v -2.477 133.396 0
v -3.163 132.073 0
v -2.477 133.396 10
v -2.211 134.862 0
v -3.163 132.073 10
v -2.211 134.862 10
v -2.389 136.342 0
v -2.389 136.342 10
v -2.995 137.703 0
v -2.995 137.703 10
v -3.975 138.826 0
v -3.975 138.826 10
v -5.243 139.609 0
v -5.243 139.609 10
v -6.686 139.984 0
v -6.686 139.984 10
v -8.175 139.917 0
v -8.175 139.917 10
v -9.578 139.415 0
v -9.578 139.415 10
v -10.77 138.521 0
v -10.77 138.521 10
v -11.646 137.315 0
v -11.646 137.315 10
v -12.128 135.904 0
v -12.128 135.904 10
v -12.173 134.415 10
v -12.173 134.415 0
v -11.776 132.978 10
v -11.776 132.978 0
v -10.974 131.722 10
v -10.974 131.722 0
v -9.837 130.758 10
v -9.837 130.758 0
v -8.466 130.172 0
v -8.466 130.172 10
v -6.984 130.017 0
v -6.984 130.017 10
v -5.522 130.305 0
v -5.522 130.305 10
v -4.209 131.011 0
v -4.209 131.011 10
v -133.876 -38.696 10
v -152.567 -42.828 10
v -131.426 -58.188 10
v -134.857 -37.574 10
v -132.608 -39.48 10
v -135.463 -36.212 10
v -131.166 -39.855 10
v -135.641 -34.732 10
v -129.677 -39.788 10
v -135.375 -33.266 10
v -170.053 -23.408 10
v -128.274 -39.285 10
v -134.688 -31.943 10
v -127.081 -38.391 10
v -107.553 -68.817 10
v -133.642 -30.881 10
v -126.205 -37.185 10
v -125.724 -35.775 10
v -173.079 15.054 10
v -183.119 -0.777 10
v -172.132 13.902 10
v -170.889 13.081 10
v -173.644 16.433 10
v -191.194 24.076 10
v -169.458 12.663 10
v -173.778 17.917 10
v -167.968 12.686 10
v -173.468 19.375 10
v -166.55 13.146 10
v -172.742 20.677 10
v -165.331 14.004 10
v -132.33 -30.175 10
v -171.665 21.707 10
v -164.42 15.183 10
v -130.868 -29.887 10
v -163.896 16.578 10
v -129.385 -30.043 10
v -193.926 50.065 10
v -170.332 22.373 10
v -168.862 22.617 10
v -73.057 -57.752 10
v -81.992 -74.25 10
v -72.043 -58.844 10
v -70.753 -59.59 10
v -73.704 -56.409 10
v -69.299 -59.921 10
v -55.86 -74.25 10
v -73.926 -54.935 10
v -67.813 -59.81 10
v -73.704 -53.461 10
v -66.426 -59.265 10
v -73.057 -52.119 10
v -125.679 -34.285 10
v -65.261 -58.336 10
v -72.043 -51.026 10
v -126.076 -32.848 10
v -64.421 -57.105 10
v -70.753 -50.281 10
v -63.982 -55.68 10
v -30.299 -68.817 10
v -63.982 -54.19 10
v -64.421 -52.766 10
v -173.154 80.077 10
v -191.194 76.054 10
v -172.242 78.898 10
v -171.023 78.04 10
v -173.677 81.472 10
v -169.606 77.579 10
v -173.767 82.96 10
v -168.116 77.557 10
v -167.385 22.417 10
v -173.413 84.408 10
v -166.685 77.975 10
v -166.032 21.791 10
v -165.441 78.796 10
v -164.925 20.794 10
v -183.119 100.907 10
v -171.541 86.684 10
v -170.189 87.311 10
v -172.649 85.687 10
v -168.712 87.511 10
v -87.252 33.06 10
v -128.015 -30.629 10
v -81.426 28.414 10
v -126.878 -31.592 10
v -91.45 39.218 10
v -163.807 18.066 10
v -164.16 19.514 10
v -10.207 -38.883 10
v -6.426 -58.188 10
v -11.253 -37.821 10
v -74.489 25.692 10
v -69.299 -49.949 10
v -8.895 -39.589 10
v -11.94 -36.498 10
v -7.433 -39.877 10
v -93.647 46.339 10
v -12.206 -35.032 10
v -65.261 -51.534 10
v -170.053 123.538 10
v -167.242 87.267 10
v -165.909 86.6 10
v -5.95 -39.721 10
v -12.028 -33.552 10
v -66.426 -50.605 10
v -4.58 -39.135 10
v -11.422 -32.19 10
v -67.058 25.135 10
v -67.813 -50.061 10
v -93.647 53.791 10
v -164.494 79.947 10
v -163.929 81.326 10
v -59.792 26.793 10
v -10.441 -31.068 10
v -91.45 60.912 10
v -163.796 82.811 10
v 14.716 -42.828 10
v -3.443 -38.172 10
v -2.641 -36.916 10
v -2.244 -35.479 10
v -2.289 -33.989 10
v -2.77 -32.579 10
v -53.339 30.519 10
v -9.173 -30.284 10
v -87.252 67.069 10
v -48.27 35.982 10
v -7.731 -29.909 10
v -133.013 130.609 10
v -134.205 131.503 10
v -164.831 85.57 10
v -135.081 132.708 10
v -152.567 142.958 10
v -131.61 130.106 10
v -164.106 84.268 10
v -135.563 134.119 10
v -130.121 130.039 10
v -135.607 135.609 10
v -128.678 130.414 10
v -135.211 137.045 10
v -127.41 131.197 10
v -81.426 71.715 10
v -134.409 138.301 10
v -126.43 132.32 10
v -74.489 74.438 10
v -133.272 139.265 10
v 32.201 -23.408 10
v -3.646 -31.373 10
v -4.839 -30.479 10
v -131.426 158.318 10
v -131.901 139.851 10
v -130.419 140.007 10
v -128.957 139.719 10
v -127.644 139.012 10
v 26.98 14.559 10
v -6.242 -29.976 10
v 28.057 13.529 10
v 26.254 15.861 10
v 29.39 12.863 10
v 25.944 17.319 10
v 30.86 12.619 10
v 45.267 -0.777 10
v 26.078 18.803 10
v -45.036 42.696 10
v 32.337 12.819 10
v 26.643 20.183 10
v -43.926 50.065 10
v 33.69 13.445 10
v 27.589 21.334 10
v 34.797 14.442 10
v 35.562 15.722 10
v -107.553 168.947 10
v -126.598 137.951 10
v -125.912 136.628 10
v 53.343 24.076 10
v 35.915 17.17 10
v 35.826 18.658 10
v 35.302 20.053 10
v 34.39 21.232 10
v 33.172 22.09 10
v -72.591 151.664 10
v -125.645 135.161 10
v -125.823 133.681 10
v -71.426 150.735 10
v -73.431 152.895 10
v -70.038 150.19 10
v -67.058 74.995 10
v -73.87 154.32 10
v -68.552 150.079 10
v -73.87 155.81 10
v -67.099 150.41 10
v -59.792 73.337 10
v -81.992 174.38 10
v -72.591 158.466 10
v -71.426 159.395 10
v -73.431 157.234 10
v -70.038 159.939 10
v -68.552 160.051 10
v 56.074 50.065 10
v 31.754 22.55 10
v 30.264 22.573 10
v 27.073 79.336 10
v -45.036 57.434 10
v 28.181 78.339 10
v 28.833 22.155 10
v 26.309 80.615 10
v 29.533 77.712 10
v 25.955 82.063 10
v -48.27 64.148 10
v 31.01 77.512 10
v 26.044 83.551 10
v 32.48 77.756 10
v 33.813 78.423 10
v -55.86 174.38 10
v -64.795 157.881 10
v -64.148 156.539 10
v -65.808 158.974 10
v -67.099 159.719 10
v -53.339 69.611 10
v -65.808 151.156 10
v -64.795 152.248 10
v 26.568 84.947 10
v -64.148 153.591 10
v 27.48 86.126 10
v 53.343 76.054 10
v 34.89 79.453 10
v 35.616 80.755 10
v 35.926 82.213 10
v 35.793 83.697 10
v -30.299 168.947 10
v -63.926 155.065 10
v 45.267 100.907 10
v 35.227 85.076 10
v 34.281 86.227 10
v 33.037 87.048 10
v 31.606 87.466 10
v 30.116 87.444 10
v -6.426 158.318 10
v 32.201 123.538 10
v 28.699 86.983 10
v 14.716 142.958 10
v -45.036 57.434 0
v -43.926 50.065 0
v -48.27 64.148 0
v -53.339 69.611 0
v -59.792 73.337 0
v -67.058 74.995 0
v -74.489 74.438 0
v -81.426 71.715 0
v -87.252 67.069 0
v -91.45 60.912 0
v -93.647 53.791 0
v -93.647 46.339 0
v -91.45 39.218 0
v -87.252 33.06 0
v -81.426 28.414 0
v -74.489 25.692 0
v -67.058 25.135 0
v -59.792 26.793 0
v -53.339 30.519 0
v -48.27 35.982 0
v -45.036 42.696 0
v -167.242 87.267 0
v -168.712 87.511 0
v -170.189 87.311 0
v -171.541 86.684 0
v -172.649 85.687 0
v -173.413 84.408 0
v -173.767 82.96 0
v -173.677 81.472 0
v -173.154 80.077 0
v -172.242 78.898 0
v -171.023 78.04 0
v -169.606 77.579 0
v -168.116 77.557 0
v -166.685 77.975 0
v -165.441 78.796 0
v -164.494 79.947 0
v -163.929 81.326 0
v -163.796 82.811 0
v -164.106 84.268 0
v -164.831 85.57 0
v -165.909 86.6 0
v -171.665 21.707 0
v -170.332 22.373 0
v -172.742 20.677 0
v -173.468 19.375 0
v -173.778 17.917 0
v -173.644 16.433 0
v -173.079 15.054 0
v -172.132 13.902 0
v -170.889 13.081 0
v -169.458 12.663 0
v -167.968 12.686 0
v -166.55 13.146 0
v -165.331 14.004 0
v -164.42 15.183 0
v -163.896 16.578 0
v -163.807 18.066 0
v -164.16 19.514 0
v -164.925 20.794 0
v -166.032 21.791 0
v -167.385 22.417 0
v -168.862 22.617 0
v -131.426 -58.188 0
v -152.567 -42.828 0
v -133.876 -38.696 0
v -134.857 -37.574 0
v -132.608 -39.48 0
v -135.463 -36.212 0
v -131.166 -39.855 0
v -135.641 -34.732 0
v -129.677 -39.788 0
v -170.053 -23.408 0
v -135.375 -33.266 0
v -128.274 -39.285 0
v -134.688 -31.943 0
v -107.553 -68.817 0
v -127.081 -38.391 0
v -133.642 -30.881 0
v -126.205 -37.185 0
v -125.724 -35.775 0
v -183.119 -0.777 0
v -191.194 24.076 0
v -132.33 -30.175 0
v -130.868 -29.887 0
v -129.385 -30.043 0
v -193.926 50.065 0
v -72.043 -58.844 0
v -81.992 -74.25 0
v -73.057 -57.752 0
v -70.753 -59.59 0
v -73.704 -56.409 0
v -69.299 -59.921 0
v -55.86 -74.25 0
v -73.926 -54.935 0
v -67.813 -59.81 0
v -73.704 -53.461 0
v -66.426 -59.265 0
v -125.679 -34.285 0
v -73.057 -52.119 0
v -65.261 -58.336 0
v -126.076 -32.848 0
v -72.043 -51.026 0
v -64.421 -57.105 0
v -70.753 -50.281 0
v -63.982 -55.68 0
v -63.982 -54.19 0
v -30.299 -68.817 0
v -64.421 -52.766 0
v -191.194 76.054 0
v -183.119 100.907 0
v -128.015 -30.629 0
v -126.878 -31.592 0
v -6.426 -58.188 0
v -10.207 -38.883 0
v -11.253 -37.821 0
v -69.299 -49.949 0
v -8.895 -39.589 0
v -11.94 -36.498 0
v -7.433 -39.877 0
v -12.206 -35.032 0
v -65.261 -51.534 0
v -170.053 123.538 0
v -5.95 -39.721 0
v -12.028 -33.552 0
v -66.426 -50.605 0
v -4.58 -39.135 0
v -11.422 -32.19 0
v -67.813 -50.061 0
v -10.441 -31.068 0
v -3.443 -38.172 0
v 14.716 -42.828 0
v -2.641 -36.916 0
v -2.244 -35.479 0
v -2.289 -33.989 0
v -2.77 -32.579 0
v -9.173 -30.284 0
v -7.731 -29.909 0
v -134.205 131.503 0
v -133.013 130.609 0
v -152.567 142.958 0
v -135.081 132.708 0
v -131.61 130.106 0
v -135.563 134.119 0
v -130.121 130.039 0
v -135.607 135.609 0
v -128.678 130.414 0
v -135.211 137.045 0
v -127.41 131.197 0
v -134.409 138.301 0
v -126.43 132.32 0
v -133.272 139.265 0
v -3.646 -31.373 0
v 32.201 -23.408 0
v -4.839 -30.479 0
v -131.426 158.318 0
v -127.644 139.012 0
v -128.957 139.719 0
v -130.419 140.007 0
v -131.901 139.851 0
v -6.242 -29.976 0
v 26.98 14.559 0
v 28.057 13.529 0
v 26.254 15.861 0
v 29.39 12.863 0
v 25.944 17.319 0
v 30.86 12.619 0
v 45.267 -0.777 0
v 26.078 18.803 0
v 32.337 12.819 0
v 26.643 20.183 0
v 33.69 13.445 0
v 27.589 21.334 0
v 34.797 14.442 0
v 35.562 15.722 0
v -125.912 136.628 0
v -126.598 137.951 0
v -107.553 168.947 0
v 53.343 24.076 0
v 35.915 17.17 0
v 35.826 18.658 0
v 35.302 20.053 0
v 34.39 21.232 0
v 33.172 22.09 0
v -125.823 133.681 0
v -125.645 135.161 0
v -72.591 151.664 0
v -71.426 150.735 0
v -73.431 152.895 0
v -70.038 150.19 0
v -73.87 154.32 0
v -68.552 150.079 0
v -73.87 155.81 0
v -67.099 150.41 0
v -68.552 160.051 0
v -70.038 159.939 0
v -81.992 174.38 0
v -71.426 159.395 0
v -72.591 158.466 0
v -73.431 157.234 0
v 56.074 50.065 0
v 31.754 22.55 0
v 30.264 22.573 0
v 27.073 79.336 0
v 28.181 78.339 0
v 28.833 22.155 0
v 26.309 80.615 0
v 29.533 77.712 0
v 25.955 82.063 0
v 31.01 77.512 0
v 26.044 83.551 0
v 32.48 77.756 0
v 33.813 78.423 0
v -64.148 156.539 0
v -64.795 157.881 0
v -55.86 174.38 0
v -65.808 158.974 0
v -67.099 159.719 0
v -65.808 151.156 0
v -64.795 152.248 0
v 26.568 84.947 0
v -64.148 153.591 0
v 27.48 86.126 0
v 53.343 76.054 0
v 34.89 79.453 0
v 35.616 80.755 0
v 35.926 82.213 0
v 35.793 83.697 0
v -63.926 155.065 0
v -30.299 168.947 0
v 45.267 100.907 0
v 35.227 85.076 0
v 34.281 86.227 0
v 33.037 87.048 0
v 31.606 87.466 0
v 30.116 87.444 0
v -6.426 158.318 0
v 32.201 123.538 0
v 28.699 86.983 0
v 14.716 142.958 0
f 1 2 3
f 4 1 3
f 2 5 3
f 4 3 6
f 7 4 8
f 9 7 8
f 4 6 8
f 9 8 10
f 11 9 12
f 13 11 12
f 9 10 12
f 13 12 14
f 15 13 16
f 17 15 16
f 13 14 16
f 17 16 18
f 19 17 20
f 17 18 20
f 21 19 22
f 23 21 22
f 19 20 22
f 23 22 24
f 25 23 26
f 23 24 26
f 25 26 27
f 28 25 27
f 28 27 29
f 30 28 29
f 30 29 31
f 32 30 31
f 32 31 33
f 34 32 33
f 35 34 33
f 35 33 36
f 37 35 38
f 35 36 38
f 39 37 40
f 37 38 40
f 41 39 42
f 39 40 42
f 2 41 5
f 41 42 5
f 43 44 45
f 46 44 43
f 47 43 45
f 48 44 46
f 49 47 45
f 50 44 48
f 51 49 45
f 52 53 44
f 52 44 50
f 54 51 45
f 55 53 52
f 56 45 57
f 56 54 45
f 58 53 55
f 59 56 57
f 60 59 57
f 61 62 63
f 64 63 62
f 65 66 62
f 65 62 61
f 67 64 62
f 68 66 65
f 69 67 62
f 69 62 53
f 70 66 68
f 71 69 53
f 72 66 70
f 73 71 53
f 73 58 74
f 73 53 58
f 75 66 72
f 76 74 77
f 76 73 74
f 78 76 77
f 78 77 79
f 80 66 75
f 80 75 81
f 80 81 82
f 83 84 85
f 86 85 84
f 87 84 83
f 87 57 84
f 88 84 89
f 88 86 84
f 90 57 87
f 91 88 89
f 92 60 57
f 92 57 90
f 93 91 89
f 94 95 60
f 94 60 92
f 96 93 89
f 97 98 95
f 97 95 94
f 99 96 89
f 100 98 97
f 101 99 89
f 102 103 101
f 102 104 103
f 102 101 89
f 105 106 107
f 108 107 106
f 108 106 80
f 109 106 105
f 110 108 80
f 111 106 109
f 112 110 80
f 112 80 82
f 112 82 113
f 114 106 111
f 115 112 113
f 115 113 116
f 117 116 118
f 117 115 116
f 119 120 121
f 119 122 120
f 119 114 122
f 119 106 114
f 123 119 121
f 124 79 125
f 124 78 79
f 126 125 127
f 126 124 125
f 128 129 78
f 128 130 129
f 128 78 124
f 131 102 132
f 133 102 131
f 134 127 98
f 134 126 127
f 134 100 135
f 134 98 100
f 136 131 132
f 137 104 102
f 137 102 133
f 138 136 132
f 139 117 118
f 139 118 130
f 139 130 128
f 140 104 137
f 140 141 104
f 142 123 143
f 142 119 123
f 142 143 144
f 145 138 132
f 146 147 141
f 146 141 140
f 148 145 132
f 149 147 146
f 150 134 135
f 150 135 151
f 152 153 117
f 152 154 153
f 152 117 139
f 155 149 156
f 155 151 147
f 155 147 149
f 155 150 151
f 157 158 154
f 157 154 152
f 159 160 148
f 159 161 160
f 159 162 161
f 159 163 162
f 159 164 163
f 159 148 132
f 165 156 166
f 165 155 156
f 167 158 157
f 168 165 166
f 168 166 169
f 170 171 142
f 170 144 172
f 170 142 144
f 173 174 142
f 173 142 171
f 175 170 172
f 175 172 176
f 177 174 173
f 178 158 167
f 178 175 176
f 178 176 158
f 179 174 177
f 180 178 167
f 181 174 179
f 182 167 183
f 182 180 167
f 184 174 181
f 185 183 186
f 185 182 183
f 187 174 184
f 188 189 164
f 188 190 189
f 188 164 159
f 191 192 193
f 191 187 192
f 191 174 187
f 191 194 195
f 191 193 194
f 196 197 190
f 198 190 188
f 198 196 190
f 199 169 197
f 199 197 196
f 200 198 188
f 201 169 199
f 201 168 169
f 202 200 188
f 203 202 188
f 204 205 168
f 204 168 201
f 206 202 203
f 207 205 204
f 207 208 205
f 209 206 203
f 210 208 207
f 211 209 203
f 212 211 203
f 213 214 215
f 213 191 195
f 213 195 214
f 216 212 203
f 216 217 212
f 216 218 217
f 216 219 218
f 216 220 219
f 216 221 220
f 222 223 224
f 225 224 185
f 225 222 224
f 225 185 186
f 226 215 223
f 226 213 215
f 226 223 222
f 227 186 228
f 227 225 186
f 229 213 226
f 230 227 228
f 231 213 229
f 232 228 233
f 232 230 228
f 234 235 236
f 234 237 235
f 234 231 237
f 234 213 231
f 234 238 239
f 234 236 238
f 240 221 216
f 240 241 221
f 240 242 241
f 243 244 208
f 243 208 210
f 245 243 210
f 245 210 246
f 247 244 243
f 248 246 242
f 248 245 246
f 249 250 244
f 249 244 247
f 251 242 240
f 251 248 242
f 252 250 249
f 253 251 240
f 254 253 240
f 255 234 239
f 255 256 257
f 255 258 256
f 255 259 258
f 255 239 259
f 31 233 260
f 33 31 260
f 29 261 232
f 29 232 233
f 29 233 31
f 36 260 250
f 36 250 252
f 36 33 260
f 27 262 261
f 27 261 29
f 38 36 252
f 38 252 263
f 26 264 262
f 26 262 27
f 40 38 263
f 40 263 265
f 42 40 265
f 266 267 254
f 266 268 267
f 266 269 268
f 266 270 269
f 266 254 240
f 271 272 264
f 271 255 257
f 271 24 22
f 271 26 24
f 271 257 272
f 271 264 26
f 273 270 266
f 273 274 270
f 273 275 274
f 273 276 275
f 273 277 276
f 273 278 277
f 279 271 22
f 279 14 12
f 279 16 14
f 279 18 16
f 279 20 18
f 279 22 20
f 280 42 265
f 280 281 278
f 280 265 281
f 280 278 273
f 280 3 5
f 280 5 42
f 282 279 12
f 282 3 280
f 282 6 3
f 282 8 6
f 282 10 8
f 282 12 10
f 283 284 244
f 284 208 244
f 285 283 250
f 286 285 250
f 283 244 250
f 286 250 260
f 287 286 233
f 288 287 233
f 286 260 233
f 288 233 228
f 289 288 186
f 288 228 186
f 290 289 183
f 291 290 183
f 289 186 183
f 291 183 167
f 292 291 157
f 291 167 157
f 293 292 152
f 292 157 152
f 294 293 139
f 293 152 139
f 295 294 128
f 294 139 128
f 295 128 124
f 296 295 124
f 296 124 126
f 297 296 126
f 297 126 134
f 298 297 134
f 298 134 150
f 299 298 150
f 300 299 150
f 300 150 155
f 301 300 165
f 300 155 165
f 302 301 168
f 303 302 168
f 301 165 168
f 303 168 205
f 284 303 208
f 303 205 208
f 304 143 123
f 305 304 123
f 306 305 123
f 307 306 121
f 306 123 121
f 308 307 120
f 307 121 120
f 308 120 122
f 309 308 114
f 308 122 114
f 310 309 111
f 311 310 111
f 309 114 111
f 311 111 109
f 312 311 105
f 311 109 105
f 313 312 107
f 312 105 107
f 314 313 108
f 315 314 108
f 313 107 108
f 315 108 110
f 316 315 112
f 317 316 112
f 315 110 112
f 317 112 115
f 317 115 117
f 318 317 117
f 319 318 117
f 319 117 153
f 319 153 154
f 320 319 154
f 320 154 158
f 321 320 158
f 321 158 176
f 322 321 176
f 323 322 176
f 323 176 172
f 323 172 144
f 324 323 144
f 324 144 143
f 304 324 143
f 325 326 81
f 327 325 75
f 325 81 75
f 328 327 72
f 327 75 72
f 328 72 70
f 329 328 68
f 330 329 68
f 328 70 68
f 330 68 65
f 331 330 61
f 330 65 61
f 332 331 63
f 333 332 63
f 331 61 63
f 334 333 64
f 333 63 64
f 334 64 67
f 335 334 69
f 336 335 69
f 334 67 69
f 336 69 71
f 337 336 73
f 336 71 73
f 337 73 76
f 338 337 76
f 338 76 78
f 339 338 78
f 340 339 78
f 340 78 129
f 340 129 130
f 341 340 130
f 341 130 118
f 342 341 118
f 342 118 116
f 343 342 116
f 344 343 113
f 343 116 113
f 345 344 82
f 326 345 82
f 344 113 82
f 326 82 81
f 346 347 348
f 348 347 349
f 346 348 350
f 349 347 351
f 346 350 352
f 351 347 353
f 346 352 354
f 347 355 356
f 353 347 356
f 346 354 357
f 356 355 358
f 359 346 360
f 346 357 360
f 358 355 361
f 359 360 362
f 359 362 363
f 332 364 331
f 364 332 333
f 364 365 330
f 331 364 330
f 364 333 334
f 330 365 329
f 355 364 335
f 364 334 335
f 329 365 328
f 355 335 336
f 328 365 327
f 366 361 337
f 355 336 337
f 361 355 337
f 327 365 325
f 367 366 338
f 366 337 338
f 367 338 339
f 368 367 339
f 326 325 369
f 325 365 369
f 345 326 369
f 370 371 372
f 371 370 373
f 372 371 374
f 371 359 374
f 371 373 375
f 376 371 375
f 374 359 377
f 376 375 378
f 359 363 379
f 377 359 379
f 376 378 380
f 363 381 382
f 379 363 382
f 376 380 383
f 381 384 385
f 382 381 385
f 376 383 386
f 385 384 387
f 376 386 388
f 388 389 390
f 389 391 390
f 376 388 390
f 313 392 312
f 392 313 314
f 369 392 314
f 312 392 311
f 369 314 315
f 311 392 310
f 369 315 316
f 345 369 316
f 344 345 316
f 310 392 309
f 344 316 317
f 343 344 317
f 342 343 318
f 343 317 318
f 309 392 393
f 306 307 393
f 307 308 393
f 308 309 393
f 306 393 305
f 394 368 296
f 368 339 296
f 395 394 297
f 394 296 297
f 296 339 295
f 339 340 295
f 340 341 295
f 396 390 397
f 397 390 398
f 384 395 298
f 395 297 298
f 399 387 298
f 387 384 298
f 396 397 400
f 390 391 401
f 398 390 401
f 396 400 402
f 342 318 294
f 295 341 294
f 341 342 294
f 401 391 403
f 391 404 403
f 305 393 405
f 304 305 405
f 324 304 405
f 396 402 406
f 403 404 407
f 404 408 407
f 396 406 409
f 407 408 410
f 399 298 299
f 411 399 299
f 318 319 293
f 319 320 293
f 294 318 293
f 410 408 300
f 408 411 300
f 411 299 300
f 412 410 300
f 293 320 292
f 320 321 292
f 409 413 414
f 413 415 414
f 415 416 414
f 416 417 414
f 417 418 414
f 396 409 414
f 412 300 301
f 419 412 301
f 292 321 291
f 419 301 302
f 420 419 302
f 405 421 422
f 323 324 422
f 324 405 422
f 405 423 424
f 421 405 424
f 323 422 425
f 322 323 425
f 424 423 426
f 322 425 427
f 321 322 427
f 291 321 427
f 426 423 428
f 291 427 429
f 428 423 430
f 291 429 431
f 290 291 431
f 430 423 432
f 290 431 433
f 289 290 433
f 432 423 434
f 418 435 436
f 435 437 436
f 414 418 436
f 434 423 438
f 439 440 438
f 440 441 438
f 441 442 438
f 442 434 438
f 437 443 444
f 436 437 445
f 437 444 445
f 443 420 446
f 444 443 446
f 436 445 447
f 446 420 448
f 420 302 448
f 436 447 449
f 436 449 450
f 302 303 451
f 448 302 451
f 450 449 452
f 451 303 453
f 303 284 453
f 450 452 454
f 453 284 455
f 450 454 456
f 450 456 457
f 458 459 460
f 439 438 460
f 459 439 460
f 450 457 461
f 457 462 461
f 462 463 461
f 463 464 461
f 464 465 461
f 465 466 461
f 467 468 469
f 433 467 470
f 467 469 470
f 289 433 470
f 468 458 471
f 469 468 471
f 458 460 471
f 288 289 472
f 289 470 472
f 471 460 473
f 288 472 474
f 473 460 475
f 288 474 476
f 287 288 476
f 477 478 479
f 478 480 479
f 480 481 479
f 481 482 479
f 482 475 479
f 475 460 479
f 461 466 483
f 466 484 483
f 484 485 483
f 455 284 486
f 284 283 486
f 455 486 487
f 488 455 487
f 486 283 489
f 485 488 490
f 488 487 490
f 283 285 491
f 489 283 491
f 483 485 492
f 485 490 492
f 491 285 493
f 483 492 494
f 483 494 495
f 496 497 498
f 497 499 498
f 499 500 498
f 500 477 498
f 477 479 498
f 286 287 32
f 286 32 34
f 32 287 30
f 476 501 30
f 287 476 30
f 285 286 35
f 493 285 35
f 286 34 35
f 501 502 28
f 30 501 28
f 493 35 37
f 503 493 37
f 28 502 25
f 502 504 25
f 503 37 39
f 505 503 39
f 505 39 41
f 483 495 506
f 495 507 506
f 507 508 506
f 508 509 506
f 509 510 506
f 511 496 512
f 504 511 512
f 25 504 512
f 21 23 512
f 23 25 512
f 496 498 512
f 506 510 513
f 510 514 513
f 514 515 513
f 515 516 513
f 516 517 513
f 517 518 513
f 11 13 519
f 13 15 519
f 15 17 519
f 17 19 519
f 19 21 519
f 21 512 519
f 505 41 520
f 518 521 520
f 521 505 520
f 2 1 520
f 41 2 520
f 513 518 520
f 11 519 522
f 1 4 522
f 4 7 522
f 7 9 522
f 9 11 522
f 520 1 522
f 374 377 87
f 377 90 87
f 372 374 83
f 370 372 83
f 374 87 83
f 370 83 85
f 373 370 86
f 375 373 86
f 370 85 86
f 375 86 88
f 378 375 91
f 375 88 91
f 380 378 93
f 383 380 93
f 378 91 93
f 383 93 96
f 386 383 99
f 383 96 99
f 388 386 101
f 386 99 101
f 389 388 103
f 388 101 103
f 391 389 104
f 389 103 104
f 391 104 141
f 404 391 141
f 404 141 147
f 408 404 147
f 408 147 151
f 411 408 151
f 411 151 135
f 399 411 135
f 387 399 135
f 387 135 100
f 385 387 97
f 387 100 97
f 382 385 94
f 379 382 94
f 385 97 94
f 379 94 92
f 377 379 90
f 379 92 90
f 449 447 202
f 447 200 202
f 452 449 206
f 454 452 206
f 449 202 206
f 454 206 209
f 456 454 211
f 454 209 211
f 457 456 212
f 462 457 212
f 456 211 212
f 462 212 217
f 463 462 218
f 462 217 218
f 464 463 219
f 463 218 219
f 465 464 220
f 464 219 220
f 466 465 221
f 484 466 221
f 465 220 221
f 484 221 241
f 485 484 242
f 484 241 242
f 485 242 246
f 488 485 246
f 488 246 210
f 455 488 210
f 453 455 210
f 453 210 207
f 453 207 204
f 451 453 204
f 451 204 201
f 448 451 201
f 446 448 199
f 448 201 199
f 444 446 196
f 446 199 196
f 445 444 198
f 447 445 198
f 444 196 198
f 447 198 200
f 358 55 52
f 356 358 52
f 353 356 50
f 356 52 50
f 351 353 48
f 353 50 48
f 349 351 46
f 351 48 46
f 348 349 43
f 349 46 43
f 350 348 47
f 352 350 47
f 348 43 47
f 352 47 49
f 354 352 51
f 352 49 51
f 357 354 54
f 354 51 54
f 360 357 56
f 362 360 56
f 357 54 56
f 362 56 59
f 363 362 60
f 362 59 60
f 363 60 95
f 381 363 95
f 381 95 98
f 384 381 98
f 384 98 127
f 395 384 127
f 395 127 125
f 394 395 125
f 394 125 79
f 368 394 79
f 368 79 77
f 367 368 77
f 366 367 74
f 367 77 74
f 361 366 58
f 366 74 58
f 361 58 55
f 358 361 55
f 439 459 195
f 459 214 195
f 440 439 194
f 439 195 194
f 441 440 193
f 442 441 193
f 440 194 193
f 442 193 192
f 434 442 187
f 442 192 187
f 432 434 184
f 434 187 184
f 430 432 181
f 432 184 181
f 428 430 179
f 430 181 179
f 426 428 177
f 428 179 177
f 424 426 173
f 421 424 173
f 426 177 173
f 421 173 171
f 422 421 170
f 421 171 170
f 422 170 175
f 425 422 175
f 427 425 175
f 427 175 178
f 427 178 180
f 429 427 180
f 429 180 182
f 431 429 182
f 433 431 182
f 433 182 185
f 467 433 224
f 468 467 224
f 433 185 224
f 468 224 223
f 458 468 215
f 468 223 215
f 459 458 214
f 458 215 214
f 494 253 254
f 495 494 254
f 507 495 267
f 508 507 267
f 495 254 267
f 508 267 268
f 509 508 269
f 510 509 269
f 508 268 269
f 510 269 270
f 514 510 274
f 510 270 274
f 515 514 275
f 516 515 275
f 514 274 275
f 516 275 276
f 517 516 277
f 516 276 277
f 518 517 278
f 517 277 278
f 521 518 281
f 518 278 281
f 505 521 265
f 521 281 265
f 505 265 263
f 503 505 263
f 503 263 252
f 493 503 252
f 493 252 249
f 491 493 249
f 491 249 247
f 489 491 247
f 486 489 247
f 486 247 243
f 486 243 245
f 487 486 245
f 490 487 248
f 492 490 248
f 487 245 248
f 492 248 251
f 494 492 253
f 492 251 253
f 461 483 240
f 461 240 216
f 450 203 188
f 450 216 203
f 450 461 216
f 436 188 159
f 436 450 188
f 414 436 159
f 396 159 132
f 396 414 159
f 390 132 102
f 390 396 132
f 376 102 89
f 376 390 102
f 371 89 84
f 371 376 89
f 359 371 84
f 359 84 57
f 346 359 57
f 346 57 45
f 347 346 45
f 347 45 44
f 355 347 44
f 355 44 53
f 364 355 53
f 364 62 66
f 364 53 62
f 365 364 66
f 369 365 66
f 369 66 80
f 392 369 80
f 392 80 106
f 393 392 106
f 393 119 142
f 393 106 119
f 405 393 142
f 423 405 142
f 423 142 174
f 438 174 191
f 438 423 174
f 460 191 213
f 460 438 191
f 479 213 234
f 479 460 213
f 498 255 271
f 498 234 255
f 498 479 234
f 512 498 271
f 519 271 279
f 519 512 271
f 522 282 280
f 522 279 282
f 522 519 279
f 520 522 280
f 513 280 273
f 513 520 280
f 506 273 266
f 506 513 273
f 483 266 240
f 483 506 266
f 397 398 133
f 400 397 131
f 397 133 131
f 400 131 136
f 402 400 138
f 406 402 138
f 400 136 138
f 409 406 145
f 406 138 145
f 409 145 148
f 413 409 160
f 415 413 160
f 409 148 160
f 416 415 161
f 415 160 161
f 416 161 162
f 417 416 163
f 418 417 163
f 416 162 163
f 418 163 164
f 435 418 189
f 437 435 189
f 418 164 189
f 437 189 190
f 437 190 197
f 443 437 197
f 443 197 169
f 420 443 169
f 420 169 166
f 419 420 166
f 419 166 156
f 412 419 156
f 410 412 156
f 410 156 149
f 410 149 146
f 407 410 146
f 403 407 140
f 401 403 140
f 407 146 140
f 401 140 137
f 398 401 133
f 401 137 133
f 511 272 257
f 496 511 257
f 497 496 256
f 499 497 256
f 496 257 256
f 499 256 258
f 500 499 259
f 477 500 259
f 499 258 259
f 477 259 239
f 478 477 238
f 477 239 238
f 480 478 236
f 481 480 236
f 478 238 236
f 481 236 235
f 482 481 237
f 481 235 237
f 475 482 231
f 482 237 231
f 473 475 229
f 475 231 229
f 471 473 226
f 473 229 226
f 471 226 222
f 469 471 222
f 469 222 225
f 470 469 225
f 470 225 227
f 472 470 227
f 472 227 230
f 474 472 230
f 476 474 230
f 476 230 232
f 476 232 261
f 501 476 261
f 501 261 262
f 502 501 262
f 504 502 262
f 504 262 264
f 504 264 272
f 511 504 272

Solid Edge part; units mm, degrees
sketch "Sketch1" plane through (0, 0, 0) normal (0, 0, 1) x (1, 0, 0)
  circle A0 centre (-68.9258, 50.0648) radius 125
  dimension "D1" = 250
extrude "Protrusion1" add sketch "Sketch1" along normal blind 10
sketch "Sketch2" plane through (-68.9258, 50.0648, 10) normal (0, 0, 1) x (1, 0, 0)
  circle A0 centre (0, 105) radius 5
  dimension "D1" = 10
  dimension "D2" = 20
extrude "Cutout1" cut sketch "Sketch2" against normal through all
pattern_circular "Pattern1" count 10 over 360 about axis through (-68.9258, 50.0648, 10) along (0, 0, -1) of "Cutout1"
sketch "Sketch3" plane through (-68.9258, 50.0648, 10) normal (0, 0, 1) x (1, 0, 0)
  circle A0 centre (0, 0) radius 25
  dimension "D1" = 50
extrude "Cutout2" cut sketch "Sketch3" against normal through all
